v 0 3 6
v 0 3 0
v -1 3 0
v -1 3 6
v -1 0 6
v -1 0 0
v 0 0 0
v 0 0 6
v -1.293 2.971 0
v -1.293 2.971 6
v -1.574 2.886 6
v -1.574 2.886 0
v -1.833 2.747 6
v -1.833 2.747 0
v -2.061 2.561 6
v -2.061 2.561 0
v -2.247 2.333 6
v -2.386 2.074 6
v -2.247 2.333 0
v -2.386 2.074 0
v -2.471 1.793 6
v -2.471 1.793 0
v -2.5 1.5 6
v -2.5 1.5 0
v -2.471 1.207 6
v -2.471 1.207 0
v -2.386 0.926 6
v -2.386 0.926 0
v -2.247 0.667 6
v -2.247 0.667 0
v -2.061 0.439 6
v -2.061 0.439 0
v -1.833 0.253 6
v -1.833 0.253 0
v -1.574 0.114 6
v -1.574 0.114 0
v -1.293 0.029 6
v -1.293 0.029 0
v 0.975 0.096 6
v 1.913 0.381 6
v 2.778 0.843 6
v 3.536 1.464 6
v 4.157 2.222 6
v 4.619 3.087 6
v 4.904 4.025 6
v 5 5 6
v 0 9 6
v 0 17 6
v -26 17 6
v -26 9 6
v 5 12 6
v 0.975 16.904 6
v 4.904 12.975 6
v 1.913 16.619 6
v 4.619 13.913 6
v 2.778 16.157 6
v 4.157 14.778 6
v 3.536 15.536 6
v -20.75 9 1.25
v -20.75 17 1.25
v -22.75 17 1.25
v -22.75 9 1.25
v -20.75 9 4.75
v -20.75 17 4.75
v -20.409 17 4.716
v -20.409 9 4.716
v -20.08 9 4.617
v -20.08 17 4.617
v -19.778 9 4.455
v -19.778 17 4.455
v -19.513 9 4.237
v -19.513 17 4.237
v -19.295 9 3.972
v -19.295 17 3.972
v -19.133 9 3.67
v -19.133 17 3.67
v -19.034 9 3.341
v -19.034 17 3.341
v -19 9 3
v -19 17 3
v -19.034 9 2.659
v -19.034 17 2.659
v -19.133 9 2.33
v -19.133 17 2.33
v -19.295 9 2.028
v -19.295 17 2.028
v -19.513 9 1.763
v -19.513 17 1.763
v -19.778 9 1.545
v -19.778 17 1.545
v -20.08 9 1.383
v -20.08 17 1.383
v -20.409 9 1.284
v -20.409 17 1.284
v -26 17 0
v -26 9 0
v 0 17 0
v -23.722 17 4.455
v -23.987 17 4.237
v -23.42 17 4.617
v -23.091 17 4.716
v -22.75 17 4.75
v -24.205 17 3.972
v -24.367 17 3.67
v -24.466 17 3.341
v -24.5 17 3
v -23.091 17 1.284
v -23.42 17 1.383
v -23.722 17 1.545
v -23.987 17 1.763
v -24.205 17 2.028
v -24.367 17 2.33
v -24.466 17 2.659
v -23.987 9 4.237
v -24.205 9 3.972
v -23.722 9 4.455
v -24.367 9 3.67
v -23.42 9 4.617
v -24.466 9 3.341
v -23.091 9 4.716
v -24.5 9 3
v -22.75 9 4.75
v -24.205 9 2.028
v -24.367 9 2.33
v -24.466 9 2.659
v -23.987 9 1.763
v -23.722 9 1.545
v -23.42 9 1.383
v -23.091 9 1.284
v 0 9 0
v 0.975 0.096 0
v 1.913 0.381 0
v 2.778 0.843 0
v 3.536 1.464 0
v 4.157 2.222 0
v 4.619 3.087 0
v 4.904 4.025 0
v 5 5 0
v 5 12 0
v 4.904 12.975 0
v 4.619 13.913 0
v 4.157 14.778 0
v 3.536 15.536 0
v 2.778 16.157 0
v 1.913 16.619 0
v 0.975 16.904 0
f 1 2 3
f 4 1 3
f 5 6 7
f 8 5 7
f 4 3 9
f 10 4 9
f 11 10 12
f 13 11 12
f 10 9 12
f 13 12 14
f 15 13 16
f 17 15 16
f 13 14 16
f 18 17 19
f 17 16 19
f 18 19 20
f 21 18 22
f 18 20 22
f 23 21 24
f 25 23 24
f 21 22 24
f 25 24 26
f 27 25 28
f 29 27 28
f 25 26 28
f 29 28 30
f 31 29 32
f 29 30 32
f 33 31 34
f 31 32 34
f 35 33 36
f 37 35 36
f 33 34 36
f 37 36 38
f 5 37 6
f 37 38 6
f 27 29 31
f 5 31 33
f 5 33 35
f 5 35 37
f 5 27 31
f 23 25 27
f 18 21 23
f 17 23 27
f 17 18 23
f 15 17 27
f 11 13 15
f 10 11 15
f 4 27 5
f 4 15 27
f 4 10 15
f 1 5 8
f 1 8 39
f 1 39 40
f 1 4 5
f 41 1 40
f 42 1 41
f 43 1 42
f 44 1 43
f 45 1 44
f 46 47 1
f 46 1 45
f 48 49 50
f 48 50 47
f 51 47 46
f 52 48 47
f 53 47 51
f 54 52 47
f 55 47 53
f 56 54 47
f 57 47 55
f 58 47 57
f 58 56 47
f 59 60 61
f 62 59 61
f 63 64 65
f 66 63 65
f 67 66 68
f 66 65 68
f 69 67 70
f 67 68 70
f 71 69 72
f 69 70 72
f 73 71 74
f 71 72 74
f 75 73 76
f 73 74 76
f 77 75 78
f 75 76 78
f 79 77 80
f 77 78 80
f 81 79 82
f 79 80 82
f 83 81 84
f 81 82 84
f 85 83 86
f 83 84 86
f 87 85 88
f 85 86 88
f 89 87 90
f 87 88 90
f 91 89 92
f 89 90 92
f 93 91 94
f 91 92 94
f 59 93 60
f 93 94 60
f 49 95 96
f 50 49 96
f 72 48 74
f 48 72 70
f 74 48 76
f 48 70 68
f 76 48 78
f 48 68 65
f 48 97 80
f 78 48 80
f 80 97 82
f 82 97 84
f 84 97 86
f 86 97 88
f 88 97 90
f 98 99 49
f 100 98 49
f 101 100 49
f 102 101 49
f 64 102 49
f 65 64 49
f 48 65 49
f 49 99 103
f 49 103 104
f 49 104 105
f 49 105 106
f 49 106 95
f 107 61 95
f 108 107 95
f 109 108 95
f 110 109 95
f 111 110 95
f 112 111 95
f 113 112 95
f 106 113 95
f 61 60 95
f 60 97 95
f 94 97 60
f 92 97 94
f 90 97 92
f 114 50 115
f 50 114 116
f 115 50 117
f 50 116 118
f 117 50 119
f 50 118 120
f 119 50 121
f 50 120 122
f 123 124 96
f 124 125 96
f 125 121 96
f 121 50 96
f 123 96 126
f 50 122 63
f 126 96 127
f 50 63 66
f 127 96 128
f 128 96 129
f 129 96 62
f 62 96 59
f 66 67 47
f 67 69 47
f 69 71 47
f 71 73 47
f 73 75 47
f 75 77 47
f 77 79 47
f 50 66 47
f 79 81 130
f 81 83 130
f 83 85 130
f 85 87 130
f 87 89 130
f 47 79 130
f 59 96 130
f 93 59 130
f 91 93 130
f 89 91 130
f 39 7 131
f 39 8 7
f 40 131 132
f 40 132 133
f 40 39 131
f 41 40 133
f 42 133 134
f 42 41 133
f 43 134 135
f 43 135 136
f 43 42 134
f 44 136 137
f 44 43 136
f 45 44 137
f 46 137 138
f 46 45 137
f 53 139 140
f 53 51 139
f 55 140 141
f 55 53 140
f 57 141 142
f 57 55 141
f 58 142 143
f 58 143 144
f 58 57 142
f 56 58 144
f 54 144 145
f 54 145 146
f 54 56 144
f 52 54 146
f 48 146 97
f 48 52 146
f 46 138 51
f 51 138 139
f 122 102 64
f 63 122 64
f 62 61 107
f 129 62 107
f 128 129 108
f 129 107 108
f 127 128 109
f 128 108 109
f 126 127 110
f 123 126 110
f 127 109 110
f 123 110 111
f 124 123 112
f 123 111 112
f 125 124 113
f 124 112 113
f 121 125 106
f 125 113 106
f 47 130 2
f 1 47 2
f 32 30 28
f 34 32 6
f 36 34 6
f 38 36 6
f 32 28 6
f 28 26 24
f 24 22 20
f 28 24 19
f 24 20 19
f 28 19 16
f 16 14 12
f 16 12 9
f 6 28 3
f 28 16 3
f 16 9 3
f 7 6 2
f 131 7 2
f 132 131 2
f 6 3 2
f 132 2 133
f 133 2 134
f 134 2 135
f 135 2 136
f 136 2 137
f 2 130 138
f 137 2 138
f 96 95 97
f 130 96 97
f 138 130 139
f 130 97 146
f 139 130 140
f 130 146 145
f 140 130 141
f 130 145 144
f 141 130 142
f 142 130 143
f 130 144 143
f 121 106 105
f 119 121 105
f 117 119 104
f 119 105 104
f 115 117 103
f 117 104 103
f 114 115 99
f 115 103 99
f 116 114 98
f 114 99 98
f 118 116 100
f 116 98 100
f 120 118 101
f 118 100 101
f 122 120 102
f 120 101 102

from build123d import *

# Parameters (mm, degrees)
F1_DEPTH = 6
F3_DEPTH = 25
F4_R     = 5


with BuildPart() as f1:
    # F0 (on Top) → F1 (new body)
    with BuildSketch(Plane.XY):
        with BuildLine():
            Line((-1, 0), (0, 0))
            Line((0, 0), (5, 0))
            Line((5, 0), (5, 17))
            Line((5, 17), (-26, 17))
            Line((-26, 17), (-26, 9))
            Line((-26, 9), (0, 9))
            Line((0, 9), (0, 3))
            Line((0, 3), (-1, 3))
            ThreePointArc((-1, 3), (-2.5, 1.5), (-1, 0))
        make_face()
    extrude(amount=F1_DEPTH)

    # F2 (on face) → F3 (cut)
    with BuildSketch(Plane(origin=(0, 17, 0), x_dir=(-1, 0, 0), z_dir=(0, 1, 0))):
        with BuildLine():
            ThreePointArc((22.75, 1.25), (23.9874368671, 1.7625631329), (24.5, 3))
            ThreePointArc((24.5, 3), (23.9874368671, 4.2374368671), (22.75, 4.75))
            Line((22.75, 4.75), (22.75, 1.25))
        make_face()
        with BuildLine():
            Line((22.75, 1.25), (22.75, 4.75))
            ThreePointArc((22.75, 4.75), (22.2259514134, 4.6696925103), (21.75, 4.4361406616))
            ThreePointArc((21.75, 4.4361406616), (22.3012092057, 3.8100925873), (22.5, 3))
            ThreePointArc((22.5, 3), (22.3012092057, 2.1899074127), (21.75, 1.5638593384))
            ThreePointArc((21.75, 1.5638593384), (22.2259514134, 1.3303074897), (22.75, 1.25))
        make_face()
        with BuildLine():
            ThreePointArc((21.75, 4.4361406616), (22.2259514134, 4.6696925103), (22.75, 4.75))
            Line((22.75, 4.75), (20.75, 4.75))
            ThreePointArc((20.75, 4.75), (21.2740485866, 4.6696925103), (21.75, 4.4361406616))
        make_face()
        with BuildLine():
            Line((20.75, 1.25), (22.75, 1.25))
            ThreePointArc((22.75, 1.25), (22.2259514134, 1.3303074897), (21.75, 1.5638593384))
            ThreePointArc((21.75, 1.5638593384), (21.2740485866, 1.3303074897), (20.75, 1.25))
        make_face()
        with BuildLine():
            ThreePointArc((21.75, 1.5638593384), (21, 3), (21.75, 4.4361406616))
            ThreePointArc((21.75, 4.4361406616), (21.2740485866, 4.6696925103), (20.75, 4.75))
            ThreePointArc((20.75, 4.75), (19, 3), (20.75, 1.25))
            ThreePointArc((20.75, 1.25), (21.2740485866, 1.3303074897), (21.75, 1.5638593384))
        make_face()
        with BuildLine():
            ThreePointArc((22.5, 3), (22.3012092057, 3.8100925873), (21.75, 4.4361406616))
            ThreePointArc((21.75, 4.4361406616), (21, 3), (21.75, 1.5638593384))
            ThreePointArc((21.75, 1.5638593384), (22.3012092057, 2.1899074127), (22.5, 3))
        make_face()
    extrude(amount=-F3_DEPTH, mode=Mode.SUBTRACT)

    # F4
    f4_edges = [f1.edges().sort_by_distance(p)[0] for p in [
        (5, 17, 3),
        (5, 0, 3),
    ]]
    fillet(f4_edges, radius=F4_R)


solid = f1.part
